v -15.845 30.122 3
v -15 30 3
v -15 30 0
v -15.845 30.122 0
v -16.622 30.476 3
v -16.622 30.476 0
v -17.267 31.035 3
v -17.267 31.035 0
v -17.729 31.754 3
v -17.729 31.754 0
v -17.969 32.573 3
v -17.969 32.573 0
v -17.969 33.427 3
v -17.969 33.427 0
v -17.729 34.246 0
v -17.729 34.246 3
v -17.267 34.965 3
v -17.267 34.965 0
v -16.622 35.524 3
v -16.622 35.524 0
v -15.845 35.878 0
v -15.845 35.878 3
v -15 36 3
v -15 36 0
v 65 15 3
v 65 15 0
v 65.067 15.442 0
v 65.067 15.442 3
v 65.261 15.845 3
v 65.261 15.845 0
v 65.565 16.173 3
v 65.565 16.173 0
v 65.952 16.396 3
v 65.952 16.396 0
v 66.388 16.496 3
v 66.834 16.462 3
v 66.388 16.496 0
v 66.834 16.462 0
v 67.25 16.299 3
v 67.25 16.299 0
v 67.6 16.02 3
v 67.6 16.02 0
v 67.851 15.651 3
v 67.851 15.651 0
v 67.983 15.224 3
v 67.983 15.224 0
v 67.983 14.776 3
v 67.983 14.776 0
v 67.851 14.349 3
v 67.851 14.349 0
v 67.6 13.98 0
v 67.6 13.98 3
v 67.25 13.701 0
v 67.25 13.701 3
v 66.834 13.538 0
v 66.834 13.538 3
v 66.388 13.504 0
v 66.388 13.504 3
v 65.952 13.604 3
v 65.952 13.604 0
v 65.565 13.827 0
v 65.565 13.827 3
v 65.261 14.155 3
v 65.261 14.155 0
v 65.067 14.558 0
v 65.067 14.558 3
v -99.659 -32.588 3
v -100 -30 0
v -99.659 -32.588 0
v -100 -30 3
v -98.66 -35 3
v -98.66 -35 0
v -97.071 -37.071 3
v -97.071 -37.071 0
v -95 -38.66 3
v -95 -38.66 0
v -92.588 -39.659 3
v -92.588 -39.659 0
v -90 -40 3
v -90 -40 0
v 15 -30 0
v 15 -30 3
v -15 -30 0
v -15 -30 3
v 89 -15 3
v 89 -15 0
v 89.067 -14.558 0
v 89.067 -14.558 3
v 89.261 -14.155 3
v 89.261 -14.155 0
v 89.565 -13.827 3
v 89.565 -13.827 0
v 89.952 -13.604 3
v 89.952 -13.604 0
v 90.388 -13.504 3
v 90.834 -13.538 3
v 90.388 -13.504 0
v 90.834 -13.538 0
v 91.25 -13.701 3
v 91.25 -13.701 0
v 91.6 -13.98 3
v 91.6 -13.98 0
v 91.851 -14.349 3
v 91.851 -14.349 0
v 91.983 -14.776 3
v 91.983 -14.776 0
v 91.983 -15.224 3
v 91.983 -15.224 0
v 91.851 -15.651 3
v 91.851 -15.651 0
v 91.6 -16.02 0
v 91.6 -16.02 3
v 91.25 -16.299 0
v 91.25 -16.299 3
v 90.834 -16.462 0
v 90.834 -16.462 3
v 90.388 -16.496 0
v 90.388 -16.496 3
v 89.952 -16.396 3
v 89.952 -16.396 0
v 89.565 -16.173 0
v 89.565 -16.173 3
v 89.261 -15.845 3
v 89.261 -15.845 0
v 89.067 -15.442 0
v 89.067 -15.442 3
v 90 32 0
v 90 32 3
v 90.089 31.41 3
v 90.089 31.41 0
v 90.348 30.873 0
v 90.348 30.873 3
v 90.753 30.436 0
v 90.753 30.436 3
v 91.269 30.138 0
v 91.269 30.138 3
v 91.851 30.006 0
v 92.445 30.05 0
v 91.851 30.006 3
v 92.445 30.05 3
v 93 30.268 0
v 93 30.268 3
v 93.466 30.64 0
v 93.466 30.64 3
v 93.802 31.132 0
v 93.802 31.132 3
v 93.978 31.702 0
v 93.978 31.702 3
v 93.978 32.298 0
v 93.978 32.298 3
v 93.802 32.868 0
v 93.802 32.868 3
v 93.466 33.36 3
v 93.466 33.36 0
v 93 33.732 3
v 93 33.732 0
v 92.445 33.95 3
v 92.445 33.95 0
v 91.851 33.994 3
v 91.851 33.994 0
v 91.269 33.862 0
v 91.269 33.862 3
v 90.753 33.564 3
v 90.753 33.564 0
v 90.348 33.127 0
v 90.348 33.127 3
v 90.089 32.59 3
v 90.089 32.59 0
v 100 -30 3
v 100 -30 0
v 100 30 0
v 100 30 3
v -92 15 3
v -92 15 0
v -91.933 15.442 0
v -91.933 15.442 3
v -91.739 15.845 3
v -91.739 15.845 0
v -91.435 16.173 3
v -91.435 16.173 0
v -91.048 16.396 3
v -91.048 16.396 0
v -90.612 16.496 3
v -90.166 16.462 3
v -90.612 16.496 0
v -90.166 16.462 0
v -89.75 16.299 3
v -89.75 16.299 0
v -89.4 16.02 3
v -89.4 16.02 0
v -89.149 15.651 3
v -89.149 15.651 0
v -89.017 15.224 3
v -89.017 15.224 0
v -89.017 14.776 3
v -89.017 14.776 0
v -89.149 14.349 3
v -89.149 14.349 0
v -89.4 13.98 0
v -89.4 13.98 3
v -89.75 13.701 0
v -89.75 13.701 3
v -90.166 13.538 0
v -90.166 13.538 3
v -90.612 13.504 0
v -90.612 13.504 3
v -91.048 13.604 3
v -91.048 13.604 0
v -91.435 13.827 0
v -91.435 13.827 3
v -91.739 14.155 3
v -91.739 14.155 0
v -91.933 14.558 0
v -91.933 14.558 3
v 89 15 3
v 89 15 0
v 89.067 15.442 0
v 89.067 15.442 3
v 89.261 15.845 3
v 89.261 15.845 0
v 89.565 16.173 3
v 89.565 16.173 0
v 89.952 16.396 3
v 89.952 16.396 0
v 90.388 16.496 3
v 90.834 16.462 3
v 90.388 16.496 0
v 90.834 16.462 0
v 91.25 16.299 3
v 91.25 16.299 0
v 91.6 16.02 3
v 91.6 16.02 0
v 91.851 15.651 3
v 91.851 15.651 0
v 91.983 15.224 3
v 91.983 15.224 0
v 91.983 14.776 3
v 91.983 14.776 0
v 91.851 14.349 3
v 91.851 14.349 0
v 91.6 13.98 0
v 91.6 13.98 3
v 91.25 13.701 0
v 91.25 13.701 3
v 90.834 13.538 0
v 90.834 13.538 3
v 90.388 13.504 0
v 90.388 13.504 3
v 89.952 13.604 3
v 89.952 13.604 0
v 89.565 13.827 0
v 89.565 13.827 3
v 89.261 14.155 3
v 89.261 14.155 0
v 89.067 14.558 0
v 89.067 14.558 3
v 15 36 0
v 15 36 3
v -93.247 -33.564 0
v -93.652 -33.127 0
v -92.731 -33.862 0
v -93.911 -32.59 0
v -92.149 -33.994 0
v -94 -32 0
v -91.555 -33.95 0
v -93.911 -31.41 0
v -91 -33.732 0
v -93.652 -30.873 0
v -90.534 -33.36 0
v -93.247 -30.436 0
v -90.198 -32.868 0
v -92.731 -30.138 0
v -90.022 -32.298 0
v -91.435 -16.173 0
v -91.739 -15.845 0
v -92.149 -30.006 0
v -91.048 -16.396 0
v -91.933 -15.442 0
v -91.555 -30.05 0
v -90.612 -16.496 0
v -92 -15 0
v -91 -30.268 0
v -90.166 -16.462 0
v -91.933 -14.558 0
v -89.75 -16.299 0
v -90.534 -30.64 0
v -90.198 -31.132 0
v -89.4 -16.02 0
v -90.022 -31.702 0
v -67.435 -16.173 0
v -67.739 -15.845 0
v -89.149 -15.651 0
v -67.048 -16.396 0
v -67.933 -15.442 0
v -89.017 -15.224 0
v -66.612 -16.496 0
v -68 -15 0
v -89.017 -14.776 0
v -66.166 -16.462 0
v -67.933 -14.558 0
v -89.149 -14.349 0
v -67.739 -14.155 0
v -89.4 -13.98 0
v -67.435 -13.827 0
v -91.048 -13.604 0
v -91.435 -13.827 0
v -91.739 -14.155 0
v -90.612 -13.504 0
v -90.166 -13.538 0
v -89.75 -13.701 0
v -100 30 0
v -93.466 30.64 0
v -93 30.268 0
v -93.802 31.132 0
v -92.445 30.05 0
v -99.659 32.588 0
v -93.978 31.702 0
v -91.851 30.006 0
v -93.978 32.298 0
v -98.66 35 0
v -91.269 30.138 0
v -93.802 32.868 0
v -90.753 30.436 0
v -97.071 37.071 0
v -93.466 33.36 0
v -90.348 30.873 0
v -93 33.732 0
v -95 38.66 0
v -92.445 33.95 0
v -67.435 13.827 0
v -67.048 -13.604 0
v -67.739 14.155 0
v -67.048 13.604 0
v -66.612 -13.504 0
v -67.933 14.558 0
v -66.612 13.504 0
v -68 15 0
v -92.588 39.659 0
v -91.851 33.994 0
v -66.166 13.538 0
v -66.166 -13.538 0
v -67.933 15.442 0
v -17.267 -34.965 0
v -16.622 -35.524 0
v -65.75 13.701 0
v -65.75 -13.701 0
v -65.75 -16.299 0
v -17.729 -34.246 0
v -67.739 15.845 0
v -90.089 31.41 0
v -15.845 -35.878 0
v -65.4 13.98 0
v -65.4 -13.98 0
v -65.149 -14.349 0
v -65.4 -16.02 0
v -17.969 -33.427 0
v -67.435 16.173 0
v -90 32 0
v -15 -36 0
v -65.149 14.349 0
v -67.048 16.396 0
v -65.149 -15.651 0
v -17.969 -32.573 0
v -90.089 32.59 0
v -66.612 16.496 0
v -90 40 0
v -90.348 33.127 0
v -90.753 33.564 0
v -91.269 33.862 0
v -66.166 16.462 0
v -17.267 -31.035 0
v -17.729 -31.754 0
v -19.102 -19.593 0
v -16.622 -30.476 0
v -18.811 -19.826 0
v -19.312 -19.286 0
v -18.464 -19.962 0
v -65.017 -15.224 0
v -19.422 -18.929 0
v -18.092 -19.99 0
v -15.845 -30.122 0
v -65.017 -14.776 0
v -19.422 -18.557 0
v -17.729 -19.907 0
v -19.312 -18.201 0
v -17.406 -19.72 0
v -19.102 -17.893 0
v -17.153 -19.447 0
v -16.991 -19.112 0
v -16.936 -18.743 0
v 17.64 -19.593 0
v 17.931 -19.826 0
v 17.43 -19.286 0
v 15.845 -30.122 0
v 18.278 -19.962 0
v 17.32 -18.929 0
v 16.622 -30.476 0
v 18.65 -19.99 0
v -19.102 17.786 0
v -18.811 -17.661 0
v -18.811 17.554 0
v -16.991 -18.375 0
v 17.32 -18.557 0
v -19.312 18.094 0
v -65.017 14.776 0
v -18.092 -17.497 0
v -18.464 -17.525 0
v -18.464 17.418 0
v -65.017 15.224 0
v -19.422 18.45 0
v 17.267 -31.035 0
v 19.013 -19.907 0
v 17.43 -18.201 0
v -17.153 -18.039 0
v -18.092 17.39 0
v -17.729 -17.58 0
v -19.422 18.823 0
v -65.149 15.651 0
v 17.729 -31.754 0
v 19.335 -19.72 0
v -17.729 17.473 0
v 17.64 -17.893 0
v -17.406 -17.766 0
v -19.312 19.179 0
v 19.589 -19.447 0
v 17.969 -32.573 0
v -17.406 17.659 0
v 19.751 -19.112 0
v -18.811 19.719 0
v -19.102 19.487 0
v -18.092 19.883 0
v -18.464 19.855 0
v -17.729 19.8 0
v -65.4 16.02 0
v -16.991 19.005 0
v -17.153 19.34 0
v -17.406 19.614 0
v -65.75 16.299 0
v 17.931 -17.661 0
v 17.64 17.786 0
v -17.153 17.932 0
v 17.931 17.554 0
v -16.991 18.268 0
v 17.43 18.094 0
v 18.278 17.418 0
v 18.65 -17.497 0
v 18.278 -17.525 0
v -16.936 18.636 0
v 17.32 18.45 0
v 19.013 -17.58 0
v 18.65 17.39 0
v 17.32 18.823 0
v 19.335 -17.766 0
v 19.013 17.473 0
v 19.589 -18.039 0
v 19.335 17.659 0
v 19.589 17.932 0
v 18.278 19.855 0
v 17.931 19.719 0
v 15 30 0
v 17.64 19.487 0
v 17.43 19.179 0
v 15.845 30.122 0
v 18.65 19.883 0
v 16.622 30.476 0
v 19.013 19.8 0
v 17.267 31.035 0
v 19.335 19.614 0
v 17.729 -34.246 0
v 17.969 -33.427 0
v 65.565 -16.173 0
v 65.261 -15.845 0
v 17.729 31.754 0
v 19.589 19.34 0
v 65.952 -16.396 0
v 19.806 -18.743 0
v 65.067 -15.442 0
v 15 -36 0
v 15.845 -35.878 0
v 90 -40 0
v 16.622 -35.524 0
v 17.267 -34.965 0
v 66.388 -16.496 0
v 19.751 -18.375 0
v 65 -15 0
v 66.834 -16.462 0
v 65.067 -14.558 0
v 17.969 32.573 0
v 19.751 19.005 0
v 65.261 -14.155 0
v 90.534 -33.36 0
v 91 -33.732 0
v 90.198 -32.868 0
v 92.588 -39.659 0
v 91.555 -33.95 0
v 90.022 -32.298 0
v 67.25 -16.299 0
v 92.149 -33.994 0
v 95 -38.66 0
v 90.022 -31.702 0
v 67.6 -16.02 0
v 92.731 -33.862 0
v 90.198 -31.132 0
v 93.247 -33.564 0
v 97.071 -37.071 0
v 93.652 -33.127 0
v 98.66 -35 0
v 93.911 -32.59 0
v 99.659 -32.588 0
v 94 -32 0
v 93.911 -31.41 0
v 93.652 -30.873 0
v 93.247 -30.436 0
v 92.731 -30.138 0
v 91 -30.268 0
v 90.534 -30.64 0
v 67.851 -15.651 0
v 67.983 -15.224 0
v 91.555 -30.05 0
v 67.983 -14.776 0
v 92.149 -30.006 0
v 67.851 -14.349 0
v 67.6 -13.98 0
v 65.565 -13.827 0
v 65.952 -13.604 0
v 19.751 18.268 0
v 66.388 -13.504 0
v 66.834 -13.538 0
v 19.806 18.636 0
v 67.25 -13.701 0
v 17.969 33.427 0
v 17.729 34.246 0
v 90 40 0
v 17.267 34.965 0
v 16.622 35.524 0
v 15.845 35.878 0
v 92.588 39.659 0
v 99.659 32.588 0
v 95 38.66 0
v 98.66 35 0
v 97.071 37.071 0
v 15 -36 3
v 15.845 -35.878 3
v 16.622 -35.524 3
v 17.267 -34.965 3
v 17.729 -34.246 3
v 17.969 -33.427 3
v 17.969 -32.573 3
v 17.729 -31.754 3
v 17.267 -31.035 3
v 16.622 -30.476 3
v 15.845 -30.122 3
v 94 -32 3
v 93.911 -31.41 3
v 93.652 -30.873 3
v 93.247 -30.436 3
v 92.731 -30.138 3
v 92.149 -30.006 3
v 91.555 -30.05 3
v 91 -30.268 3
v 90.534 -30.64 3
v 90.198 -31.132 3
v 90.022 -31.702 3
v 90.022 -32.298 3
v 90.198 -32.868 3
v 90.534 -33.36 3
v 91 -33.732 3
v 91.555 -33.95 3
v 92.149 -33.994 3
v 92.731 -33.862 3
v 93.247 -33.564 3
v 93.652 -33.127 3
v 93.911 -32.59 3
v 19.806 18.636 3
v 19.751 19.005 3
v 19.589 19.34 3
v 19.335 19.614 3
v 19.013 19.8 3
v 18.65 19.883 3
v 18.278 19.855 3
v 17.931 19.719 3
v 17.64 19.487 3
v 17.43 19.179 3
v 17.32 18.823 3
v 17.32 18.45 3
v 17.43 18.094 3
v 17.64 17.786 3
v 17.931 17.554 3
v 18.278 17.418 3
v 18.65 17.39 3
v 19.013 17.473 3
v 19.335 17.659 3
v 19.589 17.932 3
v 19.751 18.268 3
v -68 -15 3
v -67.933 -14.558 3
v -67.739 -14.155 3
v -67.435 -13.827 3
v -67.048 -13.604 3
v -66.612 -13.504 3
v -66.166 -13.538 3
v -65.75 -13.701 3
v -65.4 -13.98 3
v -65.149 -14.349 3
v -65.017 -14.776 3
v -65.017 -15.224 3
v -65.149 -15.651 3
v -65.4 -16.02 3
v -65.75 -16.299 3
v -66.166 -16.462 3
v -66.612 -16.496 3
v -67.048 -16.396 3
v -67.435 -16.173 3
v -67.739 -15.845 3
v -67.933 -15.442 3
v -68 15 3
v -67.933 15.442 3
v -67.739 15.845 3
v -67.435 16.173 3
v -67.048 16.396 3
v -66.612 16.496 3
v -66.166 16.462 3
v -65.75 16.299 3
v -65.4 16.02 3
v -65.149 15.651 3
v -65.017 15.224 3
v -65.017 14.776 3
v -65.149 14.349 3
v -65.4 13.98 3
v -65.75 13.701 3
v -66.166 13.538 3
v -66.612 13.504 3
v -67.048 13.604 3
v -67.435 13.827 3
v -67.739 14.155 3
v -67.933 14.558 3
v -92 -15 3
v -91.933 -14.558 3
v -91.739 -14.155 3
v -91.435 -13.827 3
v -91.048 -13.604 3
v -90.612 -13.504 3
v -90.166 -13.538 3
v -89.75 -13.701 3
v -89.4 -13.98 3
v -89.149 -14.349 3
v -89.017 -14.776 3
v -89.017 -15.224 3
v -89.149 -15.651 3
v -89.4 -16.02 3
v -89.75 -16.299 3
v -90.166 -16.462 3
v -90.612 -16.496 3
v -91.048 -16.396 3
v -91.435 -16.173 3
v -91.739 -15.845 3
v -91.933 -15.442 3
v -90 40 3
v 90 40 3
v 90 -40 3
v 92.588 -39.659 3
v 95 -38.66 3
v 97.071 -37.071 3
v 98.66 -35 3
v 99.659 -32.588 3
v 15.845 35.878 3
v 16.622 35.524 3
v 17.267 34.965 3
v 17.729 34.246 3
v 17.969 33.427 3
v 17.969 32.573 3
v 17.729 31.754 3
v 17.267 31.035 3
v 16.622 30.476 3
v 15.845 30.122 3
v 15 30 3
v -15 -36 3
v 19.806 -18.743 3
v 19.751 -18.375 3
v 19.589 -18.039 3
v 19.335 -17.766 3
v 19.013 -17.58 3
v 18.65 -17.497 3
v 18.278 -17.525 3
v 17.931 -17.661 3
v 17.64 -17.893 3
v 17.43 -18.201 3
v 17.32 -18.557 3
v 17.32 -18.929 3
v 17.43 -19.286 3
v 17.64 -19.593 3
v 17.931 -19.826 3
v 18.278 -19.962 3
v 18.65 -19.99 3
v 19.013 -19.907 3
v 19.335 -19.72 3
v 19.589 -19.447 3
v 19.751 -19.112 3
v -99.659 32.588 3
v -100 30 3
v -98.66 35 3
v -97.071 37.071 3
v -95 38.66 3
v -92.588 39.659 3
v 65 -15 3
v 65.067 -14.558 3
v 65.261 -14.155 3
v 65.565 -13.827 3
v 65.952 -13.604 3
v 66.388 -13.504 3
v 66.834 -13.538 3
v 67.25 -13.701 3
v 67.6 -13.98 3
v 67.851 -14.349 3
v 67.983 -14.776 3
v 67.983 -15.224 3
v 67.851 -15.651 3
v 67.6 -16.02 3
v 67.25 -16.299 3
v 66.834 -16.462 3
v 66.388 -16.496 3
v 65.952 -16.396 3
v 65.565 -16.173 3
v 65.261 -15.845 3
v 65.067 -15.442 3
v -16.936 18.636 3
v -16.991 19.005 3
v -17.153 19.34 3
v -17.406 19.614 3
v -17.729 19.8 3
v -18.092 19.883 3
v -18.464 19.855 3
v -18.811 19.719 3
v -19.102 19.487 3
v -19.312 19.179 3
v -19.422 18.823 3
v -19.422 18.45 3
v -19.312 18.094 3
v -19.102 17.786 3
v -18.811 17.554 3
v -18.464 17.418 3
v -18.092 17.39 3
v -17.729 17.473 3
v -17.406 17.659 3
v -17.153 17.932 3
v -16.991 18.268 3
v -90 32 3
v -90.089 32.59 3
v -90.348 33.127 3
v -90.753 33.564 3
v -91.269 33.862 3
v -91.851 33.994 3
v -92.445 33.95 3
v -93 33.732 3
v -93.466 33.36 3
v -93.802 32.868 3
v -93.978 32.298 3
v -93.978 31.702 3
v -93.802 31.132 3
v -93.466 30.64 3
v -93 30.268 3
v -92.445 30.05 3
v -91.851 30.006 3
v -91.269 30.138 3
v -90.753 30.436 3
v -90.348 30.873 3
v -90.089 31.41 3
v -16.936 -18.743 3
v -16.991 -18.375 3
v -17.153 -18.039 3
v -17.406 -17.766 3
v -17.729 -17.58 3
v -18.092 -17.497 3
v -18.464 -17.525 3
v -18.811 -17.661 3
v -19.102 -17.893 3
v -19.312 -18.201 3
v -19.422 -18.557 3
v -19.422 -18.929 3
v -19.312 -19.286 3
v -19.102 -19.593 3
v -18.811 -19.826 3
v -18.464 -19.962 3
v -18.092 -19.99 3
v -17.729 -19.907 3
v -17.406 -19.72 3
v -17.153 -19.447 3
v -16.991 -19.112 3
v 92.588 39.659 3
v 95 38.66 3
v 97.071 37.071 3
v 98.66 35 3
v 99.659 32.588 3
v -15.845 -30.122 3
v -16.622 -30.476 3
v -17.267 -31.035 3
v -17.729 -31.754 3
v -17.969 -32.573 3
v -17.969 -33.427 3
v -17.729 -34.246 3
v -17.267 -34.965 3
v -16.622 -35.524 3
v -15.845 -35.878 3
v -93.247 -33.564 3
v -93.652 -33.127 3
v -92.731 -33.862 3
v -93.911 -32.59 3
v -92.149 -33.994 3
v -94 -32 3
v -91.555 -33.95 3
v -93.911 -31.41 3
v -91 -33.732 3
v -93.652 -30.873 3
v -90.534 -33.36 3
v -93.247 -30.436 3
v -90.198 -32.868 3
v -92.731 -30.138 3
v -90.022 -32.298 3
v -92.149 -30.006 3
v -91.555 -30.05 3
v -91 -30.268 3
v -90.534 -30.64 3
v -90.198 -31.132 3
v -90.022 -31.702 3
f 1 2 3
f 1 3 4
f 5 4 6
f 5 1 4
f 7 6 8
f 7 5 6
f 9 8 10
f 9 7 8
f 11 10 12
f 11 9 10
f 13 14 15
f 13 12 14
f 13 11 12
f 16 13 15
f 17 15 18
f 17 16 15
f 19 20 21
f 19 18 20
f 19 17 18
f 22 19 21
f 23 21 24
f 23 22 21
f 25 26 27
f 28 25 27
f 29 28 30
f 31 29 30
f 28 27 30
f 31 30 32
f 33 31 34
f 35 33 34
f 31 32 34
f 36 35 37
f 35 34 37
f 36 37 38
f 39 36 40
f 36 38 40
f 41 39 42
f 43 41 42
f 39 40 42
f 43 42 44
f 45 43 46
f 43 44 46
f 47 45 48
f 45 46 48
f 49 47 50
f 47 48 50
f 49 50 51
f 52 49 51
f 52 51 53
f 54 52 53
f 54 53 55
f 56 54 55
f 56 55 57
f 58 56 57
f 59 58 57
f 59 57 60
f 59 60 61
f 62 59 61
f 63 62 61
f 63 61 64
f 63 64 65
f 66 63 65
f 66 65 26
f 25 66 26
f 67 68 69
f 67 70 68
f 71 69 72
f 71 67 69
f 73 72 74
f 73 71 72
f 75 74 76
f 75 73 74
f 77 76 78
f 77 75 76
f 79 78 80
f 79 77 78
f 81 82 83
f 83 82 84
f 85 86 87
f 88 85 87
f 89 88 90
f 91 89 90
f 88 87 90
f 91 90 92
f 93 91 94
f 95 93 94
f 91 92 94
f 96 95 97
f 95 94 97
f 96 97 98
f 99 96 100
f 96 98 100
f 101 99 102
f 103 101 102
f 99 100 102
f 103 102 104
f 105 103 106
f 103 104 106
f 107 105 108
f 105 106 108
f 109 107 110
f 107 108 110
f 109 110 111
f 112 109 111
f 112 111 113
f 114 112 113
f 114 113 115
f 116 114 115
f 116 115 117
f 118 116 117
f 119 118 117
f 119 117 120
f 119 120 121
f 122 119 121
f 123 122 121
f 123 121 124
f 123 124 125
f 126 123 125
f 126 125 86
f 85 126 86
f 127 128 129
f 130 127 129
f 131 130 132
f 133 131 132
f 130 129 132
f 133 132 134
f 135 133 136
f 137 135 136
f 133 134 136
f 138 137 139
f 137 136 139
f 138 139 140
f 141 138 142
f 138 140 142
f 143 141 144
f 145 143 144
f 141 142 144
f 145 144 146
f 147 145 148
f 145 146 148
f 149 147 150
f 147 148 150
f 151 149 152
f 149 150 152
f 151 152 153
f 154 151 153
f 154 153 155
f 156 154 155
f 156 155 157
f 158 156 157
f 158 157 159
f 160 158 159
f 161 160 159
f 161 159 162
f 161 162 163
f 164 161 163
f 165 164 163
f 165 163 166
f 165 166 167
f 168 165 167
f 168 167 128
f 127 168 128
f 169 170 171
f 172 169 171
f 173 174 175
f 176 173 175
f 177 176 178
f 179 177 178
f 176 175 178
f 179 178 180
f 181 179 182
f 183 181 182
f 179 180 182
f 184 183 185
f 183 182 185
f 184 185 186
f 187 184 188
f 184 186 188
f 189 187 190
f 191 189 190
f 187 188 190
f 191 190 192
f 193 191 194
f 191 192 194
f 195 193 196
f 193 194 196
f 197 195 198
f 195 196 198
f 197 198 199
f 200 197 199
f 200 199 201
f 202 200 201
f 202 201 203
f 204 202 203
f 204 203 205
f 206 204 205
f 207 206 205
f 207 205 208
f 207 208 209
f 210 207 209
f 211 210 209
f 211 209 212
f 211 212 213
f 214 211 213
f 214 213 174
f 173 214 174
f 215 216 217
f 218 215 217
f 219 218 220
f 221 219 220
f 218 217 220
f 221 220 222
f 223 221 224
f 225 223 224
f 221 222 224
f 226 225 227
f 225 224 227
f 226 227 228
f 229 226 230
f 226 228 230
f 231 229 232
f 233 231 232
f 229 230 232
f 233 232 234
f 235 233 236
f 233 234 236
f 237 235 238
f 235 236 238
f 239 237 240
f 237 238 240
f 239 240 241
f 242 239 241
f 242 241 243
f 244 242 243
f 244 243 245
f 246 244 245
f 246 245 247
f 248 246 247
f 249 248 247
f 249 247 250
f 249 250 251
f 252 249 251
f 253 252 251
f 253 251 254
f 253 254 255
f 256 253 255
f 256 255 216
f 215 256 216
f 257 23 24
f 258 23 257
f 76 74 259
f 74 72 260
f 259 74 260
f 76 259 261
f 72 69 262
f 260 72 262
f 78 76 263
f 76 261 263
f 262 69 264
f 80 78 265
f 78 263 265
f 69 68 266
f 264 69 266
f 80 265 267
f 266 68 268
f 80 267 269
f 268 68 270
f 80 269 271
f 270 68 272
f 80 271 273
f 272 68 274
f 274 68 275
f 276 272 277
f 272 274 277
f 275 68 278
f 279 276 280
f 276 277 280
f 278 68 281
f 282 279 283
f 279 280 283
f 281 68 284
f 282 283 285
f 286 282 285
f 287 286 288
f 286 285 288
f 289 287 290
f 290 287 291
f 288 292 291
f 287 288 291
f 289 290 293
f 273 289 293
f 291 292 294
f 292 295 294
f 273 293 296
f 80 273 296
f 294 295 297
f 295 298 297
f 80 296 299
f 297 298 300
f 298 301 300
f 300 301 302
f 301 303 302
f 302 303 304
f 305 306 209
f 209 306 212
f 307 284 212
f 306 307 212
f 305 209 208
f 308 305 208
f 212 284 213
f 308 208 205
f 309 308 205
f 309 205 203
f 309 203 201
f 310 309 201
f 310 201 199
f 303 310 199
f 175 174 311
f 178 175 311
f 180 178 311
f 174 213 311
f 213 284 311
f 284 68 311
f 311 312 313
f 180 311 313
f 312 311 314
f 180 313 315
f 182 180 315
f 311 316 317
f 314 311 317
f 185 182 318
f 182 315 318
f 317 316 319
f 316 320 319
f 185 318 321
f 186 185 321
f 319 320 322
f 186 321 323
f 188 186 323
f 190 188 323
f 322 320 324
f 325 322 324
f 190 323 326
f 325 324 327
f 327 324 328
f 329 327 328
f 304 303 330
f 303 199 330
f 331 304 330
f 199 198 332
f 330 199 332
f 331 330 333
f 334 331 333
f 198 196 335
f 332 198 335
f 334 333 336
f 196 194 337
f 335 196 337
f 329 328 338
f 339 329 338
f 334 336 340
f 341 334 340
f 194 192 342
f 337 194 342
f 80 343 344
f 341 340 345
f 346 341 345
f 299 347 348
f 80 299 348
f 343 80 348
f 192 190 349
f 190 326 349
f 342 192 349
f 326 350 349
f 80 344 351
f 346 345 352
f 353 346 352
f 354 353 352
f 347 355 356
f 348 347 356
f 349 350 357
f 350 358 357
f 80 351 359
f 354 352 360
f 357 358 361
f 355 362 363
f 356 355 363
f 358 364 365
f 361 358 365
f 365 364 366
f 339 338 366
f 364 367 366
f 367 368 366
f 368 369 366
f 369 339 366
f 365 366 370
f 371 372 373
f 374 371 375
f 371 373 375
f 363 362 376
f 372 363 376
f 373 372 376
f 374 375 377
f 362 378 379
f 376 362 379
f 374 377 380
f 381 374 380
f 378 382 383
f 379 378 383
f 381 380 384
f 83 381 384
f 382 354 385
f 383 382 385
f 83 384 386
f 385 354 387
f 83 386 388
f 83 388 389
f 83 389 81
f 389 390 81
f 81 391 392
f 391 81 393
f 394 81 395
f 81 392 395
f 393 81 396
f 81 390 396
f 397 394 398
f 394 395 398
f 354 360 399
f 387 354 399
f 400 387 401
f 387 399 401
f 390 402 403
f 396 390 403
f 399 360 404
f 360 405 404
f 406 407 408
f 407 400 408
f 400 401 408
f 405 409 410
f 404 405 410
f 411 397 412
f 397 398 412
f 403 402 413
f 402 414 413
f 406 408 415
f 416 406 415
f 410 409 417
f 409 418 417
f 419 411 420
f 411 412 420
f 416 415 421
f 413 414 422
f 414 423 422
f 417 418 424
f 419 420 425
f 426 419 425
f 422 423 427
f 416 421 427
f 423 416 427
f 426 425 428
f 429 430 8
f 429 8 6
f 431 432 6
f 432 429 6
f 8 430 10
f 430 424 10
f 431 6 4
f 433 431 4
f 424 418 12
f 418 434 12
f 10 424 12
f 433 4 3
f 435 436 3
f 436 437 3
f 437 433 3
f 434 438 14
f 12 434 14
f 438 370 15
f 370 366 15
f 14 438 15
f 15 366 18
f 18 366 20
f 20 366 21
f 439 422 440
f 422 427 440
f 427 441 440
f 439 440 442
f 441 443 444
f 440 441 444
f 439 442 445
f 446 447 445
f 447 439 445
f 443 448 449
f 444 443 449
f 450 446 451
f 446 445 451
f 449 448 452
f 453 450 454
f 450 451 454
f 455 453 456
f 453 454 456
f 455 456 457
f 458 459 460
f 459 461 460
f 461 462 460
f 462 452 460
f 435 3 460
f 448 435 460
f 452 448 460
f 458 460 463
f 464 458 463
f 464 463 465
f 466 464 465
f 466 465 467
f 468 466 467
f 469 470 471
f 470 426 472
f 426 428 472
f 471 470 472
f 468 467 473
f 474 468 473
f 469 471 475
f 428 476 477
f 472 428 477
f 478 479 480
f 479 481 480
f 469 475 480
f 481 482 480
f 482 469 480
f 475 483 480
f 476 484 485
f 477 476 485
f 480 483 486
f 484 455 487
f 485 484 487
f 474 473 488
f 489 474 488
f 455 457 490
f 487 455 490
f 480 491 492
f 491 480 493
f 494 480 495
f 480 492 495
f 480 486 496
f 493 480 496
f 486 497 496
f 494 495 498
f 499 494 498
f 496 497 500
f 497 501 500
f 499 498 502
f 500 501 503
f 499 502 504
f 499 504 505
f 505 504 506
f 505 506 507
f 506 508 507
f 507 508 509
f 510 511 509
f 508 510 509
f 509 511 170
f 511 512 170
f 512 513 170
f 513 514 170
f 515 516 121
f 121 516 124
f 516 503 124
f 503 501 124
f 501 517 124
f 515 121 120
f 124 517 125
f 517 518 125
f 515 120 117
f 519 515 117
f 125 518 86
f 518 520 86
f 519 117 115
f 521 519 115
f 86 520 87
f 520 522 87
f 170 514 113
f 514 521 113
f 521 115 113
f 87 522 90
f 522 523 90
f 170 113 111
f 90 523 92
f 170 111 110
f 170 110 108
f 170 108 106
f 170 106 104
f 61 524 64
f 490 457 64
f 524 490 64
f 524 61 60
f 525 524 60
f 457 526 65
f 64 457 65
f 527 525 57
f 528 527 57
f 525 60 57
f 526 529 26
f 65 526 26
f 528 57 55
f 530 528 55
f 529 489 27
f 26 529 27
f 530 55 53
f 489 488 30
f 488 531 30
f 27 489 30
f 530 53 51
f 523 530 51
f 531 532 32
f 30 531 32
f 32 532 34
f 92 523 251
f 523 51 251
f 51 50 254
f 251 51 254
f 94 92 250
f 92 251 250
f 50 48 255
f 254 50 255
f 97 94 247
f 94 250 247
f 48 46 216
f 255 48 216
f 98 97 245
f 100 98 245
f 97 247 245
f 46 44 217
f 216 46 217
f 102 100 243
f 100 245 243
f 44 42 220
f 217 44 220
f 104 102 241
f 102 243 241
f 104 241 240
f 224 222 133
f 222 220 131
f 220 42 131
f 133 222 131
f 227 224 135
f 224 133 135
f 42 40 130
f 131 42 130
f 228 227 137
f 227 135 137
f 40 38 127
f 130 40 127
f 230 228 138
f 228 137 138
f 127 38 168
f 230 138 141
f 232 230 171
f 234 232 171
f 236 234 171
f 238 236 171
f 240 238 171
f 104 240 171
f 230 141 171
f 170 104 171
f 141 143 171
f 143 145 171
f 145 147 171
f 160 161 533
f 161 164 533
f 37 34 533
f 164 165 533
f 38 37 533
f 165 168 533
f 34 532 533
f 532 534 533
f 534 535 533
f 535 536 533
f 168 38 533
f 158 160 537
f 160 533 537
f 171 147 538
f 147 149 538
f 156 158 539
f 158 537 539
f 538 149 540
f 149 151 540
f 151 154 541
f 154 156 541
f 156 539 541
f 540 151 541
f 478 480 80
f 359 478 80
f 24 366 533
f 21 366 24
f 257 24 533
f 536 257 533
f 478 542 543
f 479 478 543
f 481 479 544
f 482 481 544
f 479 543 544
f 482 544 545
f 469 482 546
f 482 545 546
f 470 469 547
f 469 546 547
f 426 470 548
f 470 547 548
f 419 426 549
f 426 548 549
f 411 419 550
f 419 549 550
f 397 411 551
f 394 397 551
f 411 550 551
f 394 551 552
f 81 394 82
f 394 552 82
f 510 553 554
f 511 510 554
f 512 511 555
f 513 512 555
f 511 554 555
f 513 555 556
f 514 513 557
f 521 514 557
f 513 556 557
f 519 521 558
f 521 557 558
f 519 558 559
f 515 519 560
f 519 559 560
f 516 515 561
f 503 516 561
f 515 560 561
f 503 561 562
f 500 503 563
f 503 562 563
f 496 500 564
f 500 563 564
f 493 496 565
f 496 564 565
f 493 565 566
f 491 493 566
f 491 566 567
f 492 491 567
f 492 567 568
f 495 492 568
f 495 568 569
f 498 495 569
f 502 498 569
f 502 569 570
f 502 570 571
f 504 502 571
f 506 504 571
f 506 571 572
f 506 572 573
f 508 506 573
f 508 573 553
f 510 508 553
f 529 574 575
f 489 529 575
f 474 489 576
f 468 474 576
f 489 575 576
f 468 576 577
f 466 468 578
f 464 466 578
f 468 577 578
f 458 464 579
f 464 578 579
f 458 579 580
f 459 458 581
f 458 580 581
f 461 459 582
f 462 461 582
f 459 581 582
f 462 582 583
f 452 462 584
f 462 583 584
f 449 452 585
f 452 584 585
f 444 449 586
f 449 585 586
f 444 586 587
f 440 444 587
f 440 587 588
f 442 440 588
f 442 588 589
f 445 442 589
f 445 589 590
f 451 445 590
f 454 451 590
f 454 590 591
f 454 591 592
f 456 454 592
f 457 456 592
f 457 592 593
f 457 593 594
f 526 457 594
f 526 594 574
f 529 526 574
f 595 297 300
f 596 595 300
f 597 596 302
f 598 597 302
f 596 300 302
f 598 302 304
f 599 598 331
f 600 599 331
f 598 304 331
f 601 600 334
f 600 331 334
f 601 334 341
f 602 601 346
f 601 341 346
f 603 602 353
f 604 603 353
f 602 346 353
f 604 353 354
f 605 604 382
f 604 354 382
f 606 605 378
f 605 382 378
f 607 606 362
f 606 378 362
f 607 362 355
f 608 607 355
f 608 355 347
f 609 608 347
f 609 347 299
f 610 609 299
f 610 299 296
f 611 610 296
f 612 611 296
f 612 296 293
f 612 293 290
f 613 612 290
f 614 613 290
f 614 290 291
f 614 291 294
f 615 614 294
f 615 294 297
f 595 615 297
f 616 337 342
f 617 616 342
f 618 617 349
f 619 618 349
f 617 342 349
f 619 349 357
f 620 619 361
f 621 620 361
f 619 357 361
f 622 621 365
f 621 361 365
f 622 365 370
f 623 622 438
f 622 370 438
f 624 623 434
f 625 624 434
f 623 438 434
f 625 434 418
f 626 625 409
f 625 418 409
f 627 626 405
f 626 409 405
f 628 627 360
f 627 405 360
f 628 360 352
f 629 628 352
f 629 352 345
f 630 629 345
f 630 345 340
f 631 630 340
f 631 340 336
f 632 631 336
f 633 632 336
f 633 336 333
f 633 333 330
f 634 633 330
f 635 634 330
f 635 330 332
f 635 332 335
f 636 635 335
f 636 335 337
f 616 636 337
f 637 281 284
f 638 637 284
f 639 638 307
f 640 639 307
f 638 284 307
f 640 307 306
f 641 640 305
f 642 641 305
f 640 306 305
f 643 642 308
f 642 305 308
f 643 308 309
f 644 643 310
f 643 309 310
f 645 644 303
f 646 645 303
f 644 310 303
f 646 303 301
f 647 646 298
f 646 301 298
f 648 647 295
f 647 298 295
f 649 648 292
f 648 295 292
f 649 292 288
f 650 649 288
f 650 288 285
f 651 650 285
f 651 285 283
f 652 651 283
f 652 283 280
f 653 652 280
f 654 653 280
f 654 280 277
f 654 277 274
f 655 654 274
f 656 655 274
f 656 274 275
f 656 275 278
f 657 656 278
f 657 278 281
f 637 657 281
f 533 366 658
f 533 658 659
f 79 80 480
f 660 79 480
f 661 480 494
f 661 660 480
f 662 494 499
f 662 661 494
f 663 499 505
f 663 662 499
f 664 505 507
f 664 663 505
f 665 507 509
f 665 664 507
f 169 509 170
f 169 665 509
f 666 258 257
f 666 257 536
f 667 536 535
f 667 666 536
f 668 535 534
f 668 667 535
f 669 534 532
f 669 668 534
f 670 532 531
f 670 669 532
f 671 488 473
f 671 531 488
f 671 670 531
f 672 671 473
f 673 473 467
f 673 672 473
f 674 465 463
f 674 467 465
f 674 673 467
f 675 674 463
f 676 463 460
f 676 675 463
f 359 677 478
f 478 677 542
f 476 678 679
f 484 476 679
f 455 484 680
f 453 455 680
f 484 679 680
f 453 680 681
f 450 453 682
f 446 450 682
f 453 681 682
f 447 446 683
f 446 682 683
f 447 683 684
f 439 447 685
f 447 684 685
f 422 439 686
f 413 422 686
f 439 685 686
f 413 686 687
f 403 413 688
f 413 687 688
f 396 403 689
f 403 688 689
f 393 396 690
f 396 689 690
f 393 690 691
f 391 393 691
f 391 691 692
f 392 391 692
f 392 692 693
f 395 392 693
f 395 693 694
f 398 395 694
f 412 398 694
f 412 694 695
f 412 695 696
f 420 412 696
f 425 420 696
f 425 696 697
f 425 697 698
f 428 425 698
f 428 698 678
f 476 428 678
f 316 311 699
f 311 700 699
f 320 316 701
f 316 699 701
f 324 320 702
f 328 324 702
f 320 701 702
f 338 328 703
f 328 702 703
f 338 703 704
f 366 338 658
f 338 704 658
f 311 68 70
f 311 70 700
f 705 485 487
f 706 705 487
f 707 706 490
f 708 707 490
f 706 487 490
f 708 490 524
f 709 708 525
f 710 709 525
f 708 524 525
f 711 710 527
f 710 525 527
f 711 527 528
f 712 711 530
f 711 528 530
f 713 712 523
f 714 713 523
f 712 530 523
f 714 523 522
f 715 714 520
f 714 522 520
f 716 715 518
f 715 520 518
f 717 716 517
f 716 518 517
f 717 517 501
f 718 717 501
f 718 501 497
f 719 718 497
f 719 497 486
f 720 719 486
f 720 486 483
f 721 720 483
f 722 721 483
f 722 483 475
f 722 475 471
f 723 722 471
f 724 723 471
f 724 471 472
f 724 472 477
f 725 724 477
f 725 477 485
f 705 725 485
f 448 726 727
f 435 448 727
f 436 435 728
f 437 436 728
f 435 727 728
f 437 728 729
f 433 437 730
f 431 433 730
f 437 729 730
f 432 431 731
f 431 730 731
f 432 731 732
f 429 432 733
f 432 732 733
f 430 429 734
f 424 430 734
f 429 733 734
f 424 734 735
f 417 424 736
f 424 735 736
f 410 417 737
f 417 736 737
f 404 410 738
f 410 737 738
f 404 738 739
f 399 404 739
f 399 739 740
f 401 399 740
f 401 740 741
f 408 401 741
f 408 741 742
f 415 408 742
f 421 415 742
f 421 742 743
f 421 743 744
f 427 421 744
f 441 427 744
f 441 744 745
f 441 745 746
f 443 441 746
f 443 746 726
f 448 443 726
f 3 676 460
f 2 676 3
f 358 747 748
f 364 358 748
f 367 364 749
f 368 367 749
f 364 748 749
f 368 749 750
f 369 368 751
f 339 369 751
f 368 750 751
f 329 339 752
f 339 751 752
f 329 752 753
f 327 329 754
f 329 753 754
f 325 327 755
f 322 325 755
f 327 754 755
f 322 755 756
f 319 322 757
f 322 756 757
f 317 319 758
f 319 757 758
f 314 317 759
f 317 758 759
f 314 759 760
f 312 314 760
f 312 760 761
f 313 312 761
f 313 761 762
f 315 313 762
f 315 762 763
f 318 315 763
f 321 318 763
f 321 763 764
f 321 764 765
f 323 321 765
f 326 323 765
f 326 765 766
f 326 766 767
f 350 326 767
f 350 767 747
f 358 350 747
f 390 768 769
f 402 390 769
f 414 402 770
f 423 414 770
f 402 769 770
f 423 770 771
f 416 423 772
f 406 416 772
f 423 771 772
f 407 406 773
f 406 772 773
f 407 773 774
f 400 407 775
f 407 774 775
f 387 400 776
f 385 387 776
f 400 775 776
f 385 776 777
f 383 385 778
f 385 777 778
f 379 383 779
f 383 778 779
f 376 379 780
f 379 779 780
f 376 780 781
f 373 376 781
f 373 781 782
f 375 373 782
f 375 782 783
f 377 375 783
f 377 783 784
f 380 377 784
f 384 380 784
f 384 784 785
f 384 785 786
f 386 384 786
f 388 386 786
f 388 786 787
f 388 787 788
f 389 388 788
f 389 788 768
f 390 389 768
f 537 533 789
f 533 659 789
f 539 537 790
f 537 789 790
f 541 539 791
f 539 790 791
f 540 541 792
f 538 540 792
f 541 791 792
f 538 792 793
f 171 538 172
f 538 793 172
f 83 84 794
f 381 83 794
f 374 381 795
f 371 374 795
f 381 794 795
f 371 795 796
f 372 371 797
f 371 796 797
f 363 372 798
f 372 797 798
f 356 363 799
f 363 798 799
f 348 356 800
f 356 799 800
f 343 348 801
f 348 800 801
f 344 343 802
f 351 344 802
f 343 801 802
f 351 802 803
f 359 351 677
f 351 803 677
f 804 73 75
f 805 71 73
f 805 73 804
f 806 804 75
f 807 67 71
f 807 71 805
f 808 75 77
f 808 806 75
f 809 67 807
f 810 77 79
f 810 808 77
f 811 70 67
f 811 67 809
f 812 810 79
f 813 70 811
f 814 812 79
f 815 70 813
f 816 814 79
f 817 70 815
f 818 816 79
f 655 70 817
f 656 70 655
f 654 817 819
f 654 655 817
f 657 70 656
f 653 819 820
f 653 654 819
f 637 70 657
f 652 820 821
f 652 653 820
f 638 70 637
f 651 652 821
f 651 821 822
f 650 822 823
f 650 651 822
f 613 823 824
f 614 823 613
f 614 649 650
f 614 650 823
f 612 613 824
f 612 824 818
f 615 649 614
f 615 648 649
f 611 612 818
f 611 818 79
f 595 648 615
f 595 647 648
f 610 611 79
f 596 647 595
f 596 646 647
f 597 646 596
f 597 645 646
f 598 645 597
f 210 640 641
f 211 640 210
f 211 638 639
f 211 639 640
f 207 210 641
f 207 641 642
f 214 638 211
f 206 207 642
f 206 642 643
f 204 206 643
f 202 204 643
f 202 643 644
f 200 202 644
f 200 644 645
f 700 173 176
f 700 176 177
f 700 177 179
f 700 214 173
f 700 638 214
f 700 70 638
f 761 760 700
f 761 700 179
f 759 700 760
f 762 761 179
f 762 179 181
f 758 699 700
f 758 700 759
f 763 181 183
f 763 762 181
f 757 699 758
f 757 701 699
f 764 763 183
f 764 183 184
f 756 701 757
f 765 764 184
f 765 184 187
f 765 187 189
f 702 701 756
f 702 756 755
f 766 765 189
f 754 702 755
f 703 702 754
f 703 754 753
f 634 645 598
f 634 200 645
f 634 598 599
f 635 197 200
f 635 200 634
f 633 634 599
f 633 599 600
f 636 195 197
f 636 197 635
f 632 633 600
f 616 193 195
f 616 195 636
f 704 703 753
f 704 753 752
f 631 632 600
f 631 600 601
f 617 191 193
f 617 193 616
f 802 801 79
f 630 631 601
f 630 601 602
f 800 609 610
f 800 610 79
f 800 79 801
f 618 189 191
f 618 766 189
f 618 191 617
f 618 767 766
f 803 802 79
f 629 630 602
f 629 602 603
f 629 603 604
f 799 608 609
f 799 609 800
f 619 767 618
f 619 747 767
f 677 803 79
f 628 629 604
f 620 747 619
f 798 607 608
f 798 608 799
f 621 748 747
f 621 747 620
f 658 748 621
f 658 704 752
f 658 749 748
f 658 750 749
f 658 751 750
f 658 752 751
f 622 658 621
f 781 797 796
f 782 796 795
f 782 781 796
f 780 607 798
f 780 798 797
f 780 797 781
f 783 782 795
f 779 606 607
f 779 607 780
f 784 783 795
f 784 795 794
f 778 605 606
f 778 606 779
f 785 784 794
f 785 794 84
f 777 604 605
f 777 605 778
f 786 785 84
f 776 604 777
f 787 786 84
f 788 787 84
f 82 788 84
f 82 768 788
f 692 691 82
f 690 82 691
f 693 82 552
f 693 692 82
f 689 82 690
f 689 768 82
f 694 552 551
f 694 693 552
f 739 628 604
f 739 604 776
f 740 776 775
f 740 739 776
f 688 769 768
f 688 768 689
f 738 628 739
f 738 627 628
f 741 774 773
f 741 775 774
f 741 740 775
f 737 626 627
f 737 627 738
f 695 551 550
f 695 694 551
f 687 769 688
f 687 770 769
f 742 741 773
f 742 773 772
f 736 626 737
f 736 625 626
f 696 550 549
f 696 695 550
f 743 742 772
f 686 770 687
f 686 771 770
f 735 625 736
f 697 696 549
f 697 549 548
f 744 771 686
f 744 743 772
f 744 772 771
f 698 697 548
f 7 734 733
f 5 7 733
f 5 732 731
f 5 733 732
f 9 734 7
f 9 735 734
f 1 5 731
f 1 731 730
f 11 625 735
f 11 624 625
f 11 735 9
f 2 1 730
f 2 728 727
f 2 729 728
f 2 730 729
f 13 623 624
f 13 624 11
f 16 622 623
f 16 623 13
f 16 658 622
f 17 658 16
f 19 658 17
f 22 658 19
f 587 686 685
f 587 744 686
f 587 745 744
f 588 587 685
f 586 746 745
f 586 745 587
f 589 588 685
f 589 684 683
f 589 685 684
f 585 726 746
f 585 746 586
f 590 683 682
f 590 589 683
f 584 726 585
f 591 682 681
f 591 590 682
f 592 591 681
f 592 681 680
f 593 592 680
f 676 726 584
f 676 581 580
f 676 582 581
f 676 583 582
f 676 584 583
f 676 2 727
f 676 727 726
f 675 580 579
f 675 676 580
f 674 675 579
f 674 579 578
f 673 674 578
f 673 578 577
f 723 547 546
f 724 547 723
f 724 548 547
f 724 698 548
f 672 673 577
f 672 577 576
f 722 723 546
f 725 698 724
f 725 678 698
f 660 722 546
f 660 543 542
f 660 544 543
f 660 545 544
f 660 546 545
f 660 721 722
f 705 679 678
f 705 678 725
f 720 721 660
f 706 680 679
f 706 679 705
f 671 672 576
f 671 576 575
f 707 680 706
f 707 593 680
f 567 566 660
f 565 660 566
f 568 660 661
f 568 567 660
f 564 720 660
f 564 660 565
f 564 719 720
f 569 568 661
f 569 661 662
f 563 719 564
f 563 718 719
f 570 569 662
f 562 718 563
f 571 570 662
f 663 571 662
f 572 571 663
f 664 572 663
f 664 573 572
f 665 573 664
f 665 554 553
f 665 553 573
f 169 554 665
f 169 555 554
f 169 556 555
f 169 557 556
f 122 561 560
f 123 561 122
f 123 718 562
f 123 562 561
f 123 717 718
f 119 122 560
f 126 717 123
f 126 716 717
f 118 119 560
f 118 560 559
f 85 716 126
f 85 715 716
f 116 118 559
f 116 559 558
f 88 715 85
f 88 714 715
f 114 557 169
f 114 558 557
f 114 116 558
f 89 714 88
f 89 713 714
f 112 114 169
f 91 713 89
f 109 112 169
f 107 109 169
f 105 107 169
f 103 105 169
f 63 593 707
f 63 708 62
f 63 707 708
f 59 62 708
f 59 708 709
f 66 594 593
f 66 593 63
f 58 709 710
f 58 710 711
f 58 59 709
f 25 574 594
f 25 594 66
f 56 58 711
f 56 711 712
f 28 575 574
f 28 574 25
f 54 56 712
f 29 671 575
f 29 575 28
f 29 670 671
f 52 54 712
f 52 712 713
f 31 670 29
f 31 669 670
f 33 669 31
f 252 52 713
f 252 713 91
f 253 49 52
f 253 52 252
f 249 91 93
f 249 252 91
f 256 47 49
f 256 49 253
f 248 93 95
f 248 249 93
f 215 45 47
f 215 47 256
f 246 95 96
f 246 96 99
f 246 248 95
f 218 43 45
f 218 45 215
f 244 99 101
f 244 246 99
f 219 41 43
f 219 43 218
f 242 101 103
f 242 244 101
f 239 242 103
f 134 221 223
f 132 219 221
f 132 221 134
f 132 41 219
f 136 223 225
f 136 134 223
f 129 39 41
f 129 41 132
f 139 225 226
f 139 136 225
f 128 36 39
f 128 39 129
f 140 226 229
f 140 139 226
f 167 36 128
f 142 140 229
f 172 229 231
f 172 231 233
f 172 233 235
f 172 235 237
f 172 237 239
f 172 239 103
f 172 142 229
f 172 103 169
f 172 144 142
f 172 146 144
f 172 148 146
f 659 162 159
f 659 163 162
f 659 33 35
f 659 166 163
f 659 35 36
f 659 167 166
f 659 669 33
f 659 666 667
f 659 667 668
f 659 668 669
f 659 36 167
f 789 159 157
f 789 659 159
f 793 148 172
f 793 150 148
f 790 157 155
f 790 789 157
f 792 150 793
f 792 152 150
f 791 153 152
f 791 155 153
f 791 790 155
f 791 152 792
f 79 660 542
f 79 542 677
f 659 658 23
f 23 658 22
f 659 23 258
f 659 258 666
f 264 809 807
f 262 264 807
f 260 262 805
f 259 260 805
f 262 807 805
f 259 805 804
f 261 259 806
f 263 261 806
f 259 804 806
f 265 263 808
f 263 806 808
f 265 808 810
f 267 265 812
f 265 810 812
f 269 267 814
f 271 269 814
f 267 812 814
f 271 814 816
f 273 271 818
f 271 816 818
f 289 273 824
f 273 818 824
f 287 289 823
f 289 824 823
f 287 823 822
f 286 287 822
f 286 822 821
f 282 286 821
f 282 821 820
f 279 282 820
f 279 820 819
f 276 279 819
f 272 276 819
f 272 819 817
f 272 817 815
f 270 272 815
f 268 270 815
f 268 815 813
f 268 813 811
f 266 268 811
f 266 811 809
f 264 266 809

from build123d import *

# Parameters (mm, degrees)
SKETCH1_W           = 200
SKETCH1_H           = 80
BOSS_EXTRUDE1_DEPTH = 3
SKETCH2_R           = 2
CUT_EXTRUDE1_DEPTH  = 108.745069493
FILLET1_R           = 10
CUT_EXTRUDE3_DEPTH  = 108.745069493
SKETCH5_R           = 1.25
CUT_EXTRUDE4_DEPTH  = 108.745069493
SKETCH6_R           = 1.5
CUT_EXTRUDE5_DEPTH  = 108.745069493


with BuildPart() as part:
    # Sketch1 → Boss-Extrude1 (new body)
    with BuildSketch(Plane.XY):
        Rectangle(SKETCH1_W, SKETCH1_H)
    extrude(amount=BOSS_EXTRUDE1_DEPTH)

    # Sketch2 → Cut-Extrude1 (cut, through all)
    with BuildSketch(Plane.XY.offset(3)):
        with Locations((-92, 32)):
            Circle(SKETCH2_R)
        with Locations(Location((-92, -32, 0), (0, 0, 180))):
            Circle(SKETCH2_R)
        with Locations((92, -32)):
            Circle(SKETCH2_R)
        with Locations(Location((92, 32, 0), (0, 0, 180))):
            Circle(SKETCH2_R)
    extrude(amount=-CUT_EXTRUDE1_DEPTH, mode=Mode.SUBTRACT)

    # Fillet1
    fillet1_edges = [part.edges().sort_by_distance(p)[0] for p in [
        (100, -40, 1.5),
        (-100, -40, 1.5),
        (-100, 40, 1.5),
        (100, 40, 1.5),
    ]]
    fillet(fillet1_edges, radius=FILLET1_R)

    # Sketch4 → Cut-Extrude3 (cut, through all)
    with BuildSketch(Plane.XY.offset(3)):
        with BuildLine():
            Line((15, 30), (-15, 30))
            ThreePointArc((-15, 30), (-18, 33), (-15, 36))
            Line((-15, 36), (15, 36))
            ThreePointArc((15, 36), (18, 33), (15, 30))
        make_face()
        with BuildLine():
            Line((15, -30), (-15, -30))
            ThreePointArc((-15, -30), (-18, -33), (-15, -36))
            Line((-15, -36), (15, -36))
            ThreePointArc((15, -36), (18, -33), (15, -30))
        make_face()
    extrude(amount=-CUT_EXTRUDE3_DEPTH, mode=Mode.SUBTRACT)

    # Sketch5 → Cut-Extrude4 (cut, through all)
    with BuildSketch(Plane.XY.offset(3)):
        with Locations((18.55608859, -18.74318761)):
            Circle(SKETCH5_R)
        with Locations((-18.18571173, -18.74318761)):
            Circle(SKETCH5_R)
        with Locations((-18.18571173, 18.63631327)):
            Circle(SKETCH5_R)
        with Locations((18.55608859, 18.63631327)):
            Circle(SKETCH5_R)
    extrude(amount=-CUT_EXTRUDE4_DEPTH, mode=Mode.SUBTRACT)

    # Sketch6 → Cut-Extrude5 (cut, through all)
    with BuildSketch(Plane(origin=(0, 0, 0), x_dir=(-1, 0, 0), z_dir=(0, 0, -1))):
        with Locations((66.5, -15)):
            Circle(SKETCH6_R)
        with Locations((90.5, -15)):
            Circle(SKETCH6_R)
        with Locations((66.5, 15)):
            Circle(SKETCH6_R)
        with Locations((90.5, 15)):
            Circle(SKETCH6_R)
        with Locations((-90.5, -15)):
            Circle(SKETCH6_R)
        with Locations((-66.5, -15)):
            Circle(SKETCH6_R)
        with Locations((-66.5, 15)):
            Circle(SKETCH6_R)
        with Locations((-90.5, 15)):
            Circle(SKETCH6_R)
    extrude(amount=-CUT_EXTRUDE5_DEPTH, mode=Mode.SUBTRACT)


solid = part.part
